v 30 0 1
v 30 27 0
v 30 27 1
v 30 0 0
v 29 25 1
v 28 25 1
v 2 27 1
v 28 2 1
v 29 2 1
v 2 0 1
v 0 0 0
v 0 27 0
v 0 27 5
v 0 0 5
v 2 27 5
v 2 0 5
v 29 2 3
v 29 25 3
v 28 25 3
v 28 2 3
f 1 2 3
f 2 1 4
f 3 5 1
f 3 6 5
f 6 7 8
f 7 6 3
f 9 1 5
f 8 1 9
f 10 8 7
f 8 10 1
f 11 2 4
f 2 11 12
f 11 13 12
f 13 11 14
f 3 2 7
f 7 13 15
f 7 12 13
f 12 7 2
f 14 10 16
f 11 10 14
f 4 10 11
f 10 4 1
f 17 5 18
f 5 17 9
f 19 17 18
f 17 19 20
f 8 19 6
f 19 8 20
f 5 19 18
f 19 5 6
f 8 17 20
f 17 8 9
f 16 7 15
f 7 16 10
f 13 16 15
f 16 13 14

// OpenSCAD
 union() {
        // GSB Door
        cube([30,27,1]);
     
        // Door Stop
        translate([28,2,1]) {
            color([1,0,0])
            cube([1,23,2]);
        }
        
        // Door Handle
        translate([0,0,1]) {
            color([0,1,0])
            cube([2,27,4]);
        }
 }
